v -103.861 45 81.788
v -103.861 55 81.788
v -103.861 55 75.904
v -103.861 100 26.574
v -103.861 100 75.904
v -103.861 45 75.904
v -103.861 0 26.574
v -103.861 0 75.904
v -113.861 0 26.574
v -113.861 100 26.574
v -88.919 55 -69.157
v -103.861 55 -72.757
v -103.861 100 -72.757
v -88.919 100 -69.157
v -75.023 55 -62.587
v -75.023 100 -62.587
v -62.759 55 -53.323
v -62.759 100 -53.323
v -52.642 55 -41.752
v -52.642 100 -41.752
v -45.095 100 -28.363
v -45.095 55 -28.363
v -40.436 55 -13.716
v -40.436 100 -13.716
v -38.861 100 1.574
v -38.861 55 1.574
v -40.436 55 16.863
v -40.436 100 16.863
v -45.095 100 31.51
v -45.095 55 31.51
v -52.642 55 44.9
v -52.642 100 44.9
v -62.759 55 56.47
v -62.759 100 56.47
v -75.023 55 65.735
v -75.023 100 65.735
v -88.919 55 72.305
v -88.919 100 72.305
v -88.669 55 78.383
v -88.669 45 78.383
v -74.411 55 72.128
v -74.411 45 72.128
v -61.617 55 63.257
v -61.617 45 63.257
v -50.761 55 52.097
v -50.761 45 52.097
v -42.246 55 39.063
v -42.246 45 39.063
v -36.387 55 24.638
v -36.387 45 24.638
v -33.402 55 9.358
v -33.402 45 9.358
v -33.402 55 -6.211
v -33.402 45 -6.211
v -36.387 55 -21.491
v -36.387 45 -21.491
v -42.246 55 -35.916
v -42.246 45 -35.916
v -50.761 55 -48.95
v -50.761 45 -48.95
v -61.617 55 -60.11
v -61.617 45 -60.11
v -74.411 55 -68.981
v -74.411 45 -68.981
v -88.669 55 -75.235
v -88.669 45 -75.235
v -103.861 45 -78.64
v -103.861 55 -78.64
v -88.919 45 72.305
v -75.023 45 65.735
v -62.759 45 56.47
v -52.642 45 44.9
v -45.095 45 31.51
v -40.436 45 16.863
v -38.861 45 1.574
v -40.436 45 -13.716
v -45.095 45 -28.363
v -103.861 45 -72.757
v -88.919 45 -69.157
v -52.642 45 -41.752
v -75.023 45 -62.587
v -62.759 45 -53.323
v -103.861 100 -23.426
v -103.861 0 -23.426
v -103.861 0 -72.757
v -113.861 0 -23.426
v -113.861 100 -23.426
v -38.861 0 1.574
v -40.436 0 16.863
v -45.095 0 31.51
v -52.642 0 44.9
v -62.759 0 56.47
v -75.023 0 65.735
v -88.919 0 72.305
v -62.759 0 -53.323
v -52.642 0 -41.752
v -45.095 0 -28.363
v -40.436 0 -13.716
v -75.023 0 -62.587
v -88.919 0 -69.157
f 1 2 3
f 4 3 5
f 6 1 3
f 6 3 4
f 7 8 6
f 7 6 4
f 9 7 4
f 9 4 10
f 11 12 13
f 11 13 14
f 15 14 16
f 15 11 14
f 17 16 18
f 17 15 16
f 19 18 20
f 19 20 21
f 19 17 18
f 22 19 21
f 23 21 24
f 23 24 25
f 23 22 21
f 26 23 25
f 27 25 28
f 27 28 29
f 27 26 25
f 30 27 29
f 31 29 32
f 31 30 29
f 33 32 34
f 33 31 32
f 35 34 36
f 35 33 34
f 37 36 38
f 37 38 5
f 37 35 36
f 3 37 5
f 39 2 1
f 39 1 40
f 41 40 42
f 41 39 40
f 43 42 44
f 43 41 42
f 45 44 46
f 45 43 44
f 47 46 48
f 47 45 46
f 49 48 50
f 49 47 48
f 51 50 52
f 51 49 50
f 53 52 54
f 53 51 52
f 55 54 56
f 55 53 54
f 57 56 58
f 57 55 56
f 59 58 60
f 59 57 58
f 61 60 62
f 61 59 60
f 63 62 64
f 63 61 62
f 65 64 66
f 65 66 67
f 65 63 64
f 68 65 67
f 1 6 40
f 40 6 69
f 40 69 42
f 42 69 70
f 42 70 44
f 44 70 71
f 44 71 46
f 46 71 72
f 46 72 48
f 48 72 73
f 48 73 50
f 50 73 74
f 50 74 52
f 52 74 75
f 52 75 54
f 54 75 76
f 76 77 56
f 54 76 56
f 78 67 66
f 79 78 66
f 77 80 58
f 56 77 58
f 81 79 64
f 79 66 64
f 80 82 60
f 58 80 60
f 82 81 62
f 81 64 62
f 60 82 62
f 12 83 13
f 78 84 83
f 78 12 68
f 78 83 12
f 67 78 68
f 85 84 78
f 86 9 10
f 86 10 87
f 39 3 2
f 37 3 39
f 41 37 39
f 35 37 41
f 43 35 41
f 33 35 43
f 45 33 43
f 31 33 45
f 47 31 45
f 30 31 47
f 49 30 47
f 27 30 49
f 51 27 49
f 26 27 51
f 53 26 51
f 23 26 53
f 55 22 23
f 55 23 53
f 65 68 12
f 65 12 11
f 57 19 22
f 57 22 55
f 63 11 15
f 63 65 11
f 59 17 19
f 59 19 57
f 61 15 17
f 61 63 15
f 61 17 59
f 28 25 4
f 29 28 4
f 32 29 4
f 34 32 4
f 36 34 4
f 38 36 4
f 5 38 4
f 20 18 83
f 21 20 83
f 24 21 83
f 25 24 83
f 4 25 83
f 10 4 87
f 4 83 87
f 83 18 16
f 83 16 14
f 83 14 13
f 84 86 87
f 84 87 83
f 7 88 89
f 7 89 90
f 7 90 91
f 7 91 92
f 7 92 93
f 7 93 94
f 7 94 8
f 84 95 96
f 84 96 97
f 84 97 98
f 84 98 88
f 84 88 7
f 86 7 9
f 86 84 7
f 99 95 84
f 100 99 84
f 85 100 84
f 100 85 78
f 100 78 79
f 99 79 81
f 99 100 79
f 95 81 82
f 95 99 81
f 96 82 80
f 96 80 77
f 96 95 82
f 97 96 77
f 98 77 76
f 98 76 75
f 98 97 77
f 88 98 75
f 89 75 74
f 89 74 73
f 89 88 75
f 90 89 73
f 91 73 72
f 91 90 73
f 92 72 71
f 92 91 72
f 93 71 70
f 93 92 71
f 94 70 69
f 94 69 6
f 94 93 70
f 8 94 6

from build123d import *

# Parameters (mm, degrees)
BOSS_EXTRUDE1_DEPTH = 100
BOSS_EXTRUDE2_DEPTH = 5


with BuildPart() as part:
    # Sketch1 → Boss-Extrude1 (new body)
    with BuildSketch(Plane(origin=(0, 0, 0), x_dir=(1, 0, 0), z_dir=(0, 1, 0))):
        with BuildLine():
            Line((-113.861275844, 23.426394533), (-103.861275844, 23.426394533))
            Line((-103.861275844, 23.426394533), (-103.861275844, 72.756738269))
            ThreePointArc((-103.861275844, 72.756738269), (-38.861275844, -1.573605467), (-103.861275844, -75.903949204))
            Line((-103.861275844, -75.903949204), (-103.861275844, -26.573605467))
            Line((-103.861275844, -26.573605467), (-113.861275844, -26.573605467))
            Line((-113.861275844, -26.573605467), (-113.861275844, 23.426394533))
        make_face()
    extrude(amount=BOSS_EXTRUDE1_DEPTH)

    # Sketch2 → Boss-Extrude2 (add, symmetric)
    with BuildSketch(Plane(origin=(0, 50, 0), x_dir=(1, 0, 0), z_dir=(0, 1, 0))):
        with BuildLine():
            Line((-103.861275844, -75.903949204), (-103.861275844, -81.787530662))
            ThreePointArc((-103.861275844, -81.787530662), (-33.026420768, -1.573605467), (-103.861275844, 78.640319727))
            Line((-103.861275844, 78.640319727), (-103.861275844, 72.756738269))
            ThreePointArc((-103.861275844, 72.756738269), (-38.861275844, -1.573605467), (-103.861275844, -75.903949204))
        make_face()
    extrude(amount=BOSS_EXTRUDE2_DEPTH, both=True)


solid = part.part
